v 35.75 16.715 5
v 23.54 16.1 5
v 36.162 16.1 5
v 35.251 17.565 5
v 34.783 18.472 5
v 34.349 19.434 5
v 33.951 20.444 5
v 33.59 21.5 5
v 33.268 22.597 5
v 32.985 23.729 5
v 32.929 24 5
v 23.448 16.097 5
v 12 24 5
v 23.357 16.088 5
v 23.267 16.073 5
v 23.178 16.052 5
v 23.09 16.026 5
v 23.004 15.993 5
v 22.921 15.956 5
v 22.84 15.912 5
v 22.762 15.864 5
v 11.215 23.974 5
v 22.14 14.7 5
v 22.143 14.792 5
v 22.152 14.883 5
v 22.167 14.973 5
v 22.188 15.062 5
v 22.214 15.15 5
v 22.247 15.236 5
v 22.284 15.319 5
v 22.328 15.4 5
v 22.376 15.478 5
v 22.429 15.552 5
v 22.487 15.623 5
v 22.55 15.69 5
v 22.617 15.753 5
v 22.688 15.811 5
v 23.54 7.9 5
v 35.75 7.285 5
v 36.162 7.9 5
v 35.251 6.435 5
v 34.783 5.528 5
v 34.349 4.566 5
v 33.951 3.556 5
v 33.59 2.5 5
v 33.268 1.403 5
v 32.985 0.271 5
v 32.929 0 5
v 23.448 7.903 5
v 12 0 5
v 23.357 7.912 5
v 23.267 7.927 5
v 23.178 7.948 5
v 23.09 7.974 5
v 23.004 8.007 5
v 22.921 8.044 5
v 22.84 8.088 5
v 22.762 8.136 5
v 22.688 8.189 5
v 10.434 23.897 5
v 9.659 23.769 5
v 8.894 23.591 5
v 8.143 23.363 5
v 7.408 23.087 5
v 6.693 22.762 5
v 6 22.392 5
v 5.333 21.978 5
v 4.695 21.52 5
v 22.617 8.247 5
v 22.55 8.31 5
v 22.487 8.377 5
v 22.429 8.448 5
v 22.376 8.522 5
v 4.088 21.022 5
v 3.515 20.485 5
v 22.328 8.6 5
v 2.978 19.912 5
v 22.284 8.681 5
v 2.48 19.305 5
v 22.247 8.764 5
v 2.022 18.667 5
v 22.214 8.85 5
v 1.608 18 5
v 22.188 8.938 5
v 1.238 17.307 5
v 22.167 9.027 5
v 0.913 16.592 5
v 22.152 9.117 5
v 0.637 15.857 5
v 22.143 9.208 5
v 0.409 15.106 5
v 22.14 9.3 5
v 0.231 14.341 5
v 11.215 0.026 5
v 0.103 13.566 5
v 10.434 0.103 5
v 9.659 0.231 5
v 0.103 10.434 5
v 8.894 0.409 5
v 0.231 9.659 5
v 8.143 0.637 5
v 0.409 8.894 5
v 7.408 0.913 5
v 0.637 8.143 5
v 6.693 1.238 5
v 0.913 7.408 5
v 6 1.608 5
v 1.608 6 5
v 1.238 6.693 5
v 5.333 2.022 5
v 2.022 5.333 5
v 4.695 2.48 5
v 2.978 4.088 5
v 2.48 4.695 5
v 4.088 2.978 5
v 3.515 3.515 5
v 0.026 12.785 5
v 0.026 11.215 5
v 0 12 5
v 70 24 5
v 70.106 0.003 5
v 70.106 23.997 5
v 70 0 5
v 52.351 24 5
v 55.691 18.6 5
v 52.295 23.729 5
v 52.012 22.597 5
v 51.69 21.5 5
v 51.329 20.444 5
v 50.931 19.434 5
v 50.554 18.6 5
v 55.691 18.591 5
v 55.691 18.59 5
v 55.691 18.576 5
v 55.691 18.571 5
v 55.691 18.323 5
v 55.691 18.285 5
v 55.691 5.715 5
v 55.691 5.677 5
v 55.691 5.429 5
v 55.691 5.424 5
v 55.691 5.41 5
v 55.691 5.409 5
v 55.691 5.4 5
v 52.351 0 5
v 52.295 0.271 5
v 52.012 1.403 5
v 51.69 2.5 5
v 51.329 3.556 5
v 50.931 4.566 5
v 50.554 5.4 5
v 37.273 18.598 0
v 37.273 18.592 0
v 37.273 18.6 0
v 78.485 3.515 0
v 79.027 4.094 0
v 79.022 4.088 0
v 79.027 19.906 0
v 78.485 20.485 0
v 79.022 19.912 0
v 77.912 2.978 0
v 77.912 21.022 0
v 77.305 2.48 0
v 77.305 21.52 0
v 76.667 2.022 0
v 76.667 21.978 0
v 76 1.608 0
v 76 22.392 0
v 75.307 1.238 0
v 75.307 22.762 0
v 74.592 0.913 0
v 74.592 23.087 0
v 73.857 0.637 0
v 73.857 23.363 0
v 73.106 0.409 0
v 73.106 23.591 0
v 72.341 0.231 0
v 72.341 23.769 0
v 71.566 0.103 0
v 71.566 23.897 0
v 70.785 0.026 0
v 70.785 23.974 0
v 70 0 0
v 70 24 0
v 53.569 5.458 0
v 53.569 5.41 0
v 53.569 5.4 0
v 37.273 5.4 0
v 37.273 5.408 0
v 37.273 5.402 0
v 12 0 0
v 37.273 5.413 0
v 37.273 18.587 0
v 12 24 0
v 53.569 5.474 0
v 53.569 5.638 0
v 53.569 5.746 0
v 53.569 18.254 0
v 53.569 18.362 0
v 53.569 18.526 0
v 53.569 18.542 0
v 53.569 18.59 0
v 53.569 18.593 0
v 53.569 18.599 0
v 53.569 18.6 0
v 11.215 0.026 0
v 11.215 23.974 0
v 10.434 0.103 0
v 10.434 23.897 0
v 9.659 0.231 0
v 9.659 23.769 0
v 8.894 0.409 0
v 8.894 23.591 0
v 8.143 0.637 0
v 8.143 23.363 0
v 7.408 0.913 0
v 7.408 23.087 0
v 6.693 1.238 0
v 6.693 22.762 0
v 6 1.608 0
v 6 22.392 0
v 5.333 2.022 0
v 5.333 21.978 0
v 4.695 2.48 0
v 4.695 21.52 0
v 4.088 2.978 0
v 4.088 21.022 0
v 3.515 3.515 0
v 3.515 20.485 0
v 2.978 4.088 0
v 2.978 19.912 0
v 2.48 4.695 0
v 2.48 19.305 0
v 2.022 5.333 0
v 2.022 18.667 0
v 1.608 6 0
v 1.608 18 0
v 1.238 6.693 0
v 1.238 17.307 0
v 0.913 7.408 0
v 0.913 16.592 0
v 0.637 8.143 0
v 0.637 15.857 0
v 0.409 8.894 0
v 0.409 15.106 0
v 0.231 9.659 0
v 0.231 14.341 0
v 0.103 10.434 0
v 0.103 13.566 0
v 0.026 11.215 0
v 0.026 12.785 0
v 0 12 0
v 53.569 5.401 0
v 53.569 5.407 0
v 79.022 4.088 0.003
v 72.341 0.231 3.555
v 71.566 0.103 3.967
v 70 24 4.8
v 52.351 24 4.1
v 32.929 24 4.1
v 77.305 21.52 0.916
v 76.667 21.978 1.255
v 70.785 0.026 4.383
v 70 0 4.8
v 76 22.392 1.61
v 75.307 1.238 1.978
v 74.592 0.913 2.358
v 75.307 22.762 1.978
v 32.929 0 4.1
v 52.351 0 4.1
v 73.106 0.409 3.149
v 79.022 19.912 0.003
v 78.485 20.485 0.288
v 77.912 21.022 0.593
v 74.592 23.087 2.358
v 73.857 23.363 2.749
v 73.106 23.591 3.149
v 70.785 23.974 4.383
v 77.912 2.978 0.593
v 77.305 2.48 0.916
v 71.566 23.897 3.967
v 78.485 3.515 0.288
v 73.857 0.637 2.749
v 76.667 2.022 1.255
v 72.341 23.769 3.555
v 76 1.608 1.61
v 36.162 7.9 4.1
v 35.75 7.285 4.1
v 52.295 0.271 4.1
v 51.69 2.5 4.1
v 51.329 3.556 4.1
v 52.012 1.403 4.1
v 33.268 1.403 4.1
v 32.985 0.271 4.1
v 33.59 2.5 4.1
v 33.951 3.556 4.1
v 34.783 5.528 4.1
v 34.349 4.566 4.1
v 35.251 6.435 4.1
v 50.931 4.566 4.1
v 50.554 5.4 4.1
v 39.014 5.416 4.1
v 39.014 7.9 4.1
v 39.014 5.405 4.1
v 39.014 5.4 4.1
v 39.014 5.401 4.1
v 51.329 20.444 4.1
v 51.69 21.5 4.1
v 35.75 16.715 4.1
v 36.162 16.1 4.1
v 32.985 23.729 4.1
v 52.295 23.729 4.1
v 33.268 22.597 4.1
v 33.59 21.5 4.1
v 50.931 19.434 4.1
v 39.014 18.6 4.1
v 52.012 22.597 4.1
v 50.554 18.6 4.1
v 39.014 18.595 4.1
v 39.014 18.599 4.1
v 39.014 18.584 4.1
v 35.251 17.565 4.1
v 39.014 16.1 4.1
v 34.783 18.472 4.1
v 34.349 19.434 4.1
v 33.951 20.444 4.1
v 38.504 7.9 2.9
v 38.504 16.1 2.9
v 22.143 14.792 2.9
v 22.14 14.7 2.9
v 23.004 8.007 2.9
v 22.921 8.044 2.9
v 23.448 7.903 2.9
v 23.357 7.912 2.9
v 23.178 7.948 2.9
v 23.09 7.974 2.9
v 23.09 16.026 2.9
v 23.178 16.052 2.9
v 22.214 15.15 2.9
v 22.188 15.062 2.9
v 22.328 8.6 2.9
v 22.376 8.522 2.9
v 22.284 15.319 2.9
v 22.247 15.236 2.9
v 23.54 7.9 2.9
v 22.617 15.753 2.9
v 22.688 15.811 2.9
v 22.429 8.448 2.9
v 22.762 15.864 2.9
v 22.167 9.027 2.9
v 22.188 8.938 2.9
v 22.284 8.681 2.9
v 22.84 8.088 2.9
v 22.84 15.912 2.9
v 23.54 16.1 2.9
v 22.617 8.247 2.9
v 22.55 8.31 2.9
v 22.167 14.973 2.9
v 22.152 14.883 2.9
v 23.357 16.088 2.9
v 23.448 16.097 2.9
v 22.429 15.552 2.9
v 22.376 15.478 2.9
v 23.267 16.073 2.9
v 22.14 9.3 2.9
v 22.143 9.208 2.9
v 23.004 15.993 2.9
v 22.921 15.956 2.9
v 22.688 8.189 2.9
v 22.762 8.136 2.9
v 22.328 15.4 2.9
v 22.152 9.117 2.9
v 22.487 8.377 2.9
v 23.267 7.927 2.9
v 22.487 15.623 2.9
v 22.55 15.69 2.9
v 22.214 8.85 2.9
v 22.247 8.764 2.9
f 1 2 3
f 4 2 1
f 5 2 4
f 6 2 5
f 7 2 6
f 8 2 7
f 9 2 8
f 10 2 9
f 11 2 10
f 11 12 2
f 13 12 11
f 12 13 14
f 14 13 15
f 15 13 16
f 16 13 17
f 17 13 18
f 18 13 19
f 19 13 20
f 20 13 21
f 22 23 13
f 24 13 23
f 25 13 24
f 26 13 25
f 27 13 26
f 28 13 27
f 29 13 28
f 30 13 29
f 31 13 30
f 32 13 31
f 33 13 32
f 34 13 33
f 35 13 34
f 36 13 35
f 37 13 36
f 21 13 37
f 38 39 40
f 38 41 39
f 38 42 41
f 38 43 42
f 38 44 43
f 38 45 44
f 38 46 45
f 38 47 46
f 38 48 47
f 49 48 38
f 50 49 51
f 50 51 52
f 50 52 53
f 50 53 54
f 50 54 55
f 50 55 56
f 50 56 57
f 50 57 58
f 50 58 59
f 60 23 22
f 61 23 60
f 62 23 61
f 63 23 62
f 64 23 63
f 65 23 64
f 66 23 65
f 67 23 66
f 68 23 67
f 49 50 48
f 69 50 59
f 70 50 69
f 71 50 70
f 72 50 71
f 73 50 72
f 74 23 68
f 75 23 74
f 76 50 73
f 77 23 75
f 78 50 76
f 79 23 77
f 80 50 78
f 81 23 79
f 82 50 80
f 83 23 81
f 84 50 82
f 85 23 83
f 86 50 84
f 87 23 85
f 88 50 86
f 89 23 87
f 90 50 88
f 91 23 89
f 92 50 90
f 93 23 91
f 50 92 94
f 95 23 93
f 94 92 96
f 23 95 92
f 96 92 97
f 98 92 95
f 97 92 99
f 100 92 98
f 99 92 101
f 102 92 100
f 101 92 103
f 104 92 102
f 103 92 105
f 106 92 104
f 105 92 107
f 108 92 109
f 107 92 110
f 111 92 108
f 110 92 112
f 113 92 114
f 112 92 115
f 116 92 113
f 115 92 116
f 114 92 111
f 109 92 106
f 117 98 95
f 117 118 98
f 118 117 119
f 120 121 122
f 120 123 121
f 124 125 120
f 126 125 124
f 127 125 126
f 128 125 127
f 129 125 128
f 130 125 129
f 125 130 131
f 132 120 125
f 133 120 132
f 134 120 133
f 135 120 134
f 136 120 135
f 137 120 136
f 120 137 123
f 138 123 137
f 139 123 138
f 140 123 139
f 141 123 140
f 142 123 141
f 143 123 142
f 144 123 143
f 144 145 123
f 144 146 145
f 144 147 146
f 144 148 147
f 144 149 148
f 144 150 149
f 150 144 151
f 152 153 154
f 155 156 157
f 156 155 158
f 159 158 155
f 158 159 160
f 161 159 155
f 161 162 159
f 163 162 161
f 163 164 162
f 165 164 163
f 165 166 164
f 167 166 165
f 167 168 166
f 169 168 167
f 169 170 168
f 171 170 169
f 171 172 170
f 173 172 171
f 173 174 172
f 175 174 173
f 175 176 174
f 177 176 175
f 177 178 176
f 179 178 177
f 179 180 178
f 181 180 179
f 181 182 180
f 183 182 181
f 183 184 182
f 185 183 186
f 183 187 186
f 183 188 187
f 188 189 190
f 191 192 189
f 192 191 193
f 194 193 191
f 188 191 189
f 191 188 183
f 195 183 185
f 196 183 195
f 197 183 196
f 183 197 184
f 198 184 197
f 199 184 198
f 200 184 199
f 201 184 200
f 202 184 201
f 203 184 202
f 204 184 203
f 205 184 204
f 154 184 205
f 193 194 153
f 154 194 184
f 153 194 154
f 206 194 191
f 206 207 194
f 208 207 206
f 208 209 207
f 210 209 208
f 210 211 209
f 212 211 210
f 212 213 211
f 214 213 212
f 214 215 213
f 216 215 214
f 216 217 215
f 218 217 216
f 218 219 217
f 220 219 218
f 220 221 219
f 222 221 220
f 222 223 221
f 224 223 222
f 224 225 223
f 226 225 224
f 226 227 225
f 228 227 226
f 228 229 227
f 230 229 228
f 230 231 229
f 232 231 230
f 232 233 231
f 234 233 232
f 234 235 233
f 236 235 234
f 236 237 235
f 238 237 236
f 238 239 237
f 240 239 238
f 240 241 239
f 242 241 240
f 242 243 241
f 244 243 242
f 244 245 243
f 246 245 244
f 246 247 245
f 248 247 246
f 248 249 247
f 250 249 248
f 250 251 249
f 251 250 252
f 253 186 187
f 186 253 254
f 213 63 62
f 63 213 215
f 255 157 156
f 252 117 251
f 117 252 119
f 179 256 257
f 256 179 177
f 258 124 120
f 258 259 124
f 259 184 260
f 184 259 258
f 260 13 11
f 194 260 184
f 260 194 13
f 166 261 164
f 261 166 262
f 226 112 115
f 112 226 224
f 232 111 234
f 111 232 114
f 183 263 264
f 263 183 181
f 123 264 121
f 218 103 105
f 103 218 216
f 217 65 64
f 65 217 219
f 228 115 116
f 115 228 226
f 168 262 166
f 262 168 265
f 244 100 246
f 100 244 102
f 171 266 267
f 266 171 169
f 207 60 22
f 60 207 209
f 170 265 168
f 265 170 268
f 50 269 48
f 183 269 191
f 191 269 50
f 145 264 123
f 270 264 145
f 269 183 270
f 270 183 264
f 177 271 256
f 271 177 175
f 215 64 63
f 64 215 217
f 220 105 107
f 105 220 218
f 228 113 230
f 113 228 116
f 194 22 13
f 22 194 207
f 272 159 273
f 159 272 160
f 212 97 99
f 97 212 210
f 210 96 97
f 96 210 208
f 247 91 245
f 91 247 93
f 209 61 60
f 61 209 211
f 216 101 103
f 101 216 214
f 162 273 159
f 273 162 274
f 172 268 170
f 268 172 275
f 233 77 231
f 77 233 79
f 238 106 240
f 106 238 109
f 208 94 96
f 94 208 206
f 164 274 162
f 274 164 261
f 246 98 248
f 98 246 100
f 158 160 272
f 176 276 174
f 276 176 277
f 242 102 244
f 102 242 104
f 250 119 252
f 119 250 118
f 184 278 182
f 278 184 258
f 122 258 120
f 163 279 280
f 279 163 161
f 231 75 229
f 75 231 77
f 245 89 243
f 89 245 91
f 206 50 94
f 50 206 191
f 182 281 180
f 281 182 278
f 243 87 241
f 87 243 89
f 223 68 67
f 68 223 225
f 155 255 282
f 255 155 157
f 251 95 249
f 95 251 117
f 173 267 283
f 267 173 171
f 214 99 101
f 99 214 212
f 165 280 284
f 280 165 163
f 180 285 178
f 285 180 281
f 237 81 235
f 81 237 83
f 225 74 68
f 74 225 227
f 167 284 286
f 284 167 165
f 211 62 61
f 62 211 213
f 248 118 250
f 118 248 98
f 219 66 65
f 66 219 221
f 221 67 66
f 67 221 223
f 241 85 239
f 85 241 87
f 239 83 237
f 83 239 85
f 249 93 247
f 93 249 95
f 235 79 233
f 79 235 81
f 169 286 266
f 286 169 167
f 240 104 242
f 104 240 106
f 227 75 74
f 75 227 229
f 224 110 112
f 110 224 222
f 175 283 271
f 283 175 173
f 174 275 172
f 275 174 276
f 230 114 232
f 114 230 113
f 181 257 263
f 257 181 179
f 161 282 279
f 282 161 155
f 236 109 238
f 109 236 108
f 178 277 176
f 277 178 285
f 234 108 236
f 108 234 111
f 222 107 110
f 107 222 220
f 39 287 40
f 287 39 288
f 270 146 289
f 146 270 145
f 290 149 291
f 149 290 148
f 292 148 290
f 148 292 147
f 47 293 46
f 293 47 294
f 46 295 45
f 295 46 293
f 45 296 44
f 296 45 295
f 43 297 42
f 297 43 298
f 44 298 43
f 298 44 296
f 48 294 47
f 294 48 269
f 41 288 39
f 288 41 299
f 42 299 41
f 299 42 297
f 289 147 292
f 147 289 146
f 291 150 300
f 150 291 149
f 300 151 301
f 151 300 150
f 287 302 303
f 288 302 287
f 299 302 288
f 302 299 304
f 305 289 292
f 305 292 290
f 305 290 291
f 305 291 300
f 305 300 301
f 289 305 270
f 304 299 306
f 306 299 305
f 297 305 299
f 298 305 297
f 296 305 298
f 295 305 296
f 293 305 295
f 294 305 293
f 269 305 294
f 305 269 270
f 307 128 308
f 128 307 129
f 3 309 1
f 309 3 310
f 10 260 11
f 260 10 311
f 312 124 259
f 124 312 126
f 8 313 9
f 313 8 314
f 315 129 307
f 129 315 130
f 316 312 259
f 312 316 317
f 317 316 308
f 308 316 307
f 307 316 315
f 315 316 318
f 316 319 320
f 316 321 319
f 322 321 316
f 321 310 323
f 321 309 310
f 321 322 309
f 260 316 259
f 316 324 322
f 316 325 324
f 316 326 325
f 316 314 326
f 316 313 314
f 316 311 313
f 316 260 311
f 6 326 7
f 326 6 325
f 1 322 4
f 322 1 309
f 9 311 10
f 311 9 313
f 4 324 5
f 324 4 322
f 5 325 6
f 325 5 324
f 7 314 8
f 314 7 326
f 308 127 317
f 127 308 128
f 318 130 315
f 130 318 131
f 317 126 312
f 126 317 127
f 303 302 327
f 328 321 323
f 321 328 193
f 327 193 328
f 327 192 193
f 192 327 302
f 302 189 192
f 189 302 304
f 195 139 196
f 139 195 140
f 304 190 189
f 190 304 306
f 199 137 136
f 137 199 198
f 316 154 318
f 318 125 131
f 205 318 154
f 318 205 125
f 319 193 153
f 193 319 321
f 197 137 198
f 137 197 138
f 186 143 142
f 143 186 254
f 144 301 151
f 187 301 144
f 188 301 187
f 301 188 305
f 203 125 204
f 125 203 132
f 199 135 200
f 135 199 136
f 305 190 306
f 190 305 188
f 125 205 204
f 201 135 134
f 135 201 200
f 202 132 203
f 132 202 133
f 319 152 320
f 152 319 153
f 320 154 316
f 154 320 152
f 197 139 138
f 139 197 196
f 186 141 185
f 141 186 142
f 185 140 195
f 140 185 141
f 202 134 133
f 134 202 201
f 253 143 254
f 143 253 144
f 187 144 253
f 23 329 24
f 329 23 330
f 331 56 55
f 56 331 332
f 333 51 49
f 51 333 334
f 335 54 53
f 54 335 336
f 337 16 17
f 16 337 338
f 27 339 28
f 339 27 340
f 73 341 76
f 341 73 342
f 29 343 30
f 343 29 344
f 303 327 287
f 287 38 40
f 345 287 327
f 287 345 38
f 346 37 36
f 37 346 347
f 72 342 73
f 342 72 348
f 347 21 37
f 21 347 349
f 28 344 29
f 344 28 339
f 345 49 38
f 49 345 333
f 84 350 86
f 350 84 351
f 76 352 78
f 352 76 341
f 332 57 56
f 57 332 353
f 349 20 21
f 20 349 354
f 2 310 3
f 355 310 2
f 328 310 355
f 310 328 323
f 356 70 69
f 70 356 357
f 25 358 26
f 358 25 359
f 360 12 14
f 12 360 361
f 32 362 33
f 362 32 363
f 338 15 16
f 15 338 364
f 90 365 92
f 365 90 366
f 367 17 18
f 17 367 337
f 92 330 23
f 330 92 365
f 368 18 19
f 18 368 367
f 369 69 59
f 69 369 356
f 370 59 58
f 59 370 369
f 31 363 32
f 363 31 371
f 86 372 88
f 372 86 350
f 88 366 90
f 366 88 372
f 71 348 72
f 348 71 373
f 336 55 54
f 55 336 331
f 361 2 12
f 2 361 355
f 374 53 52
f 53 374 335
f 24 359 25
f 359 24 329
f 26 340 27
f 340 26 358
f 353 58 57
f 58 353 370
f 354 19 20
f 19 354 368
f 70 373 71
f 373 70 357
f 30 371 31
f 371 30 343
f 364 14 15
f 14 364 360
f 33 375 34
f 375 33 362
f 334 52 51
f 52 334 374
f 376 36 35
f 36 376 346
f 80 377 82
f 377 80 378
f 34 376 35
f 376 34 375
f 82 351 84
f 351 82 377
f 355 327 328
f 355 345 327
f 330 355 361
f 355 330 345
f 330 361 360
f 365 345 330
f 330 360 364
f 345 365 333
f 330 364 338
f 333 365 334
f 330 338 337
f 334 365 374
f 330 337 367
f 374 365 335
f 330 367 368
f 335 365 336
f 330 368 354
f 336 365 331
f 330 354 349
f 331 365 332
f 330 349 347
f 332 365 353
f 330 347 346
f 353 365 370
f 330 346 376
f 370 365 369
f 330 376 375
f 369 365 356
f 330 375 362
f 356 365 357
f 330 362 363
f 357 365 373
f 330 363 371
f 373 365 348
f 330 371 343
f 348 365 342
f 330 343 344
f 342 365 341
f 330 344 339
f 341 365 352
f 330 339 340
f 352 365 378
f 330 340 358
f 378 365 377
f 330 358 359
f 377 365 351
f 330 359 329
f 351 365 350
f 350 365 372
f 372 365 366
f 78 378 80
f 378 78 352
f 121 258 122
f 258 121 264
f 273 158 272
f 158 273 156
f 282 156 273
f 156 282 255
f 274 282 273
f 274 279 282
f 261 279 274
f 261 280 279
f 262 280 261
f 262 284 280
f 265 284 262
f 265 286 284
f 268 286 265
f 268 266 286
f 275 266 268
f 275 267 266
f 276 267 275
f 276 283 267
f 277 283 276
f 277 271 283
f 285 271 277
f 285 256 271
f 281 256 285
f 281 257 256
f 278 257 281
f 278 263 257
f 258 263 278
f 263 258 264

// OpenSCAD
// ArcDock Key V2
// Minimal keychain phone stand with refined silhouette and better visual balance.

$fn = 96;

// ---------- Parameters (mm) ----------
body_len      = 82;
body_w        = 24;
body_h        = 5.0;

ring_outer_d  = 14;
ring_hole_d   = 5.0;
ring_x        = 9;

slot_w        = 13.2; // smartphone + most slim/medium cases
slot_d        = 20;
slot_angle    = 67;
slot_floor    = 1.2;

lip_h         = 2.4;
lip_t         = 1.7;

waist_cut_d   = 38;   // soft hourglass waist for aesthetics + grip
waist_depth   = 0.9;

window_l      = 28;   // visual lightness window
window_w      = 8.2;
window_z      = 2.1;

// ---------- Helpers ----------
module capsule2d(len, wid) {
    hull() {
        translate([wid / 2, wid / 2]) circle(d = wid);
        translate([len - wid / 2, wid / 2]) circle(d = wid);
    }
}

module rounded_block(len, wid, hei, rad) {
    hull() {
        for (x = [rad, len - rad])
            for (y = [rad, wid - rad])
                translate([x, y, 0]) cylinder(h = hei, r = rad);
    }
}

module base_body() {
    linear_extrude(height = body_h)
        capsule2d(body_len, body_w);
}

module keyring_pad() {
    translate([ring_x, body_w / 2, 0])
        difference() {
            cylinder(h = body_h, d = ring_outer_d);
            translate([0, 0, -0.2]) cylinder(h = body_h + 0.4, d = ring_hole_d);
        }
}

module phone_slot_cut() {
    // Main slot cut, tilted for natural viewing angle.
    translate([body_len * 0.58, body_w / 2, slot_floor])
        rotate([0, -slot_angle, 0])
            translate([-slot_d / 2, -slot_w / 2, -body_h * 1.2])
                rounded_block(slot_d, slot_w, body_h * 3, 1.2);
}

module comfort_top_sweep() {
    // Subtle top sweep at tail for a cleaner profile.
    translate([body_len - 12, -2, body_h - 0.2])
        rotate([0, 28, 0])
            cube([22, body_w + 4, body_h * 2]);
}

module waist_reliefs() {
    // Gentle side reliefs to avoid a plain rectangular look.
    for (y = [-waist_cut_d / 2, waist_cut_d / 2])
        translate([body_len * 0.52, body_w / 2 + y, body_h - waist_depth])
            rotate([0, 0, 90])
                scale([1.0, 0.55, 1])
                    cylinder(h = waist_depth + 0.2, d = waist_cut_d);
}

module center_window() {
    // Window gives lightness and a stronger premium aesthetic.
    translate([body_len * 0.27, (body_w - window_w) / 2, body_h - window_z])
        rounded_block(window_l, window_w, window_z + 0.2, 1.4);
}

module front_lip() {
    // Anti-slip lip where phone rests.
    translate([body_len * 0.76, (body_w - slot_w) / 2, body_h - lip_h])
        rounded_block(lip_t, slot_w, lip_h, 0.5);
}

// ---------- Final ----------
module model() {
    difference() {
        union() {
            base_body();
            keyring_pad();
            front_lip();
        }

        phone_slot_cut();
        center_window();
        comfort_top_sweep();
        waist_reliefs();
    }
}

model();
